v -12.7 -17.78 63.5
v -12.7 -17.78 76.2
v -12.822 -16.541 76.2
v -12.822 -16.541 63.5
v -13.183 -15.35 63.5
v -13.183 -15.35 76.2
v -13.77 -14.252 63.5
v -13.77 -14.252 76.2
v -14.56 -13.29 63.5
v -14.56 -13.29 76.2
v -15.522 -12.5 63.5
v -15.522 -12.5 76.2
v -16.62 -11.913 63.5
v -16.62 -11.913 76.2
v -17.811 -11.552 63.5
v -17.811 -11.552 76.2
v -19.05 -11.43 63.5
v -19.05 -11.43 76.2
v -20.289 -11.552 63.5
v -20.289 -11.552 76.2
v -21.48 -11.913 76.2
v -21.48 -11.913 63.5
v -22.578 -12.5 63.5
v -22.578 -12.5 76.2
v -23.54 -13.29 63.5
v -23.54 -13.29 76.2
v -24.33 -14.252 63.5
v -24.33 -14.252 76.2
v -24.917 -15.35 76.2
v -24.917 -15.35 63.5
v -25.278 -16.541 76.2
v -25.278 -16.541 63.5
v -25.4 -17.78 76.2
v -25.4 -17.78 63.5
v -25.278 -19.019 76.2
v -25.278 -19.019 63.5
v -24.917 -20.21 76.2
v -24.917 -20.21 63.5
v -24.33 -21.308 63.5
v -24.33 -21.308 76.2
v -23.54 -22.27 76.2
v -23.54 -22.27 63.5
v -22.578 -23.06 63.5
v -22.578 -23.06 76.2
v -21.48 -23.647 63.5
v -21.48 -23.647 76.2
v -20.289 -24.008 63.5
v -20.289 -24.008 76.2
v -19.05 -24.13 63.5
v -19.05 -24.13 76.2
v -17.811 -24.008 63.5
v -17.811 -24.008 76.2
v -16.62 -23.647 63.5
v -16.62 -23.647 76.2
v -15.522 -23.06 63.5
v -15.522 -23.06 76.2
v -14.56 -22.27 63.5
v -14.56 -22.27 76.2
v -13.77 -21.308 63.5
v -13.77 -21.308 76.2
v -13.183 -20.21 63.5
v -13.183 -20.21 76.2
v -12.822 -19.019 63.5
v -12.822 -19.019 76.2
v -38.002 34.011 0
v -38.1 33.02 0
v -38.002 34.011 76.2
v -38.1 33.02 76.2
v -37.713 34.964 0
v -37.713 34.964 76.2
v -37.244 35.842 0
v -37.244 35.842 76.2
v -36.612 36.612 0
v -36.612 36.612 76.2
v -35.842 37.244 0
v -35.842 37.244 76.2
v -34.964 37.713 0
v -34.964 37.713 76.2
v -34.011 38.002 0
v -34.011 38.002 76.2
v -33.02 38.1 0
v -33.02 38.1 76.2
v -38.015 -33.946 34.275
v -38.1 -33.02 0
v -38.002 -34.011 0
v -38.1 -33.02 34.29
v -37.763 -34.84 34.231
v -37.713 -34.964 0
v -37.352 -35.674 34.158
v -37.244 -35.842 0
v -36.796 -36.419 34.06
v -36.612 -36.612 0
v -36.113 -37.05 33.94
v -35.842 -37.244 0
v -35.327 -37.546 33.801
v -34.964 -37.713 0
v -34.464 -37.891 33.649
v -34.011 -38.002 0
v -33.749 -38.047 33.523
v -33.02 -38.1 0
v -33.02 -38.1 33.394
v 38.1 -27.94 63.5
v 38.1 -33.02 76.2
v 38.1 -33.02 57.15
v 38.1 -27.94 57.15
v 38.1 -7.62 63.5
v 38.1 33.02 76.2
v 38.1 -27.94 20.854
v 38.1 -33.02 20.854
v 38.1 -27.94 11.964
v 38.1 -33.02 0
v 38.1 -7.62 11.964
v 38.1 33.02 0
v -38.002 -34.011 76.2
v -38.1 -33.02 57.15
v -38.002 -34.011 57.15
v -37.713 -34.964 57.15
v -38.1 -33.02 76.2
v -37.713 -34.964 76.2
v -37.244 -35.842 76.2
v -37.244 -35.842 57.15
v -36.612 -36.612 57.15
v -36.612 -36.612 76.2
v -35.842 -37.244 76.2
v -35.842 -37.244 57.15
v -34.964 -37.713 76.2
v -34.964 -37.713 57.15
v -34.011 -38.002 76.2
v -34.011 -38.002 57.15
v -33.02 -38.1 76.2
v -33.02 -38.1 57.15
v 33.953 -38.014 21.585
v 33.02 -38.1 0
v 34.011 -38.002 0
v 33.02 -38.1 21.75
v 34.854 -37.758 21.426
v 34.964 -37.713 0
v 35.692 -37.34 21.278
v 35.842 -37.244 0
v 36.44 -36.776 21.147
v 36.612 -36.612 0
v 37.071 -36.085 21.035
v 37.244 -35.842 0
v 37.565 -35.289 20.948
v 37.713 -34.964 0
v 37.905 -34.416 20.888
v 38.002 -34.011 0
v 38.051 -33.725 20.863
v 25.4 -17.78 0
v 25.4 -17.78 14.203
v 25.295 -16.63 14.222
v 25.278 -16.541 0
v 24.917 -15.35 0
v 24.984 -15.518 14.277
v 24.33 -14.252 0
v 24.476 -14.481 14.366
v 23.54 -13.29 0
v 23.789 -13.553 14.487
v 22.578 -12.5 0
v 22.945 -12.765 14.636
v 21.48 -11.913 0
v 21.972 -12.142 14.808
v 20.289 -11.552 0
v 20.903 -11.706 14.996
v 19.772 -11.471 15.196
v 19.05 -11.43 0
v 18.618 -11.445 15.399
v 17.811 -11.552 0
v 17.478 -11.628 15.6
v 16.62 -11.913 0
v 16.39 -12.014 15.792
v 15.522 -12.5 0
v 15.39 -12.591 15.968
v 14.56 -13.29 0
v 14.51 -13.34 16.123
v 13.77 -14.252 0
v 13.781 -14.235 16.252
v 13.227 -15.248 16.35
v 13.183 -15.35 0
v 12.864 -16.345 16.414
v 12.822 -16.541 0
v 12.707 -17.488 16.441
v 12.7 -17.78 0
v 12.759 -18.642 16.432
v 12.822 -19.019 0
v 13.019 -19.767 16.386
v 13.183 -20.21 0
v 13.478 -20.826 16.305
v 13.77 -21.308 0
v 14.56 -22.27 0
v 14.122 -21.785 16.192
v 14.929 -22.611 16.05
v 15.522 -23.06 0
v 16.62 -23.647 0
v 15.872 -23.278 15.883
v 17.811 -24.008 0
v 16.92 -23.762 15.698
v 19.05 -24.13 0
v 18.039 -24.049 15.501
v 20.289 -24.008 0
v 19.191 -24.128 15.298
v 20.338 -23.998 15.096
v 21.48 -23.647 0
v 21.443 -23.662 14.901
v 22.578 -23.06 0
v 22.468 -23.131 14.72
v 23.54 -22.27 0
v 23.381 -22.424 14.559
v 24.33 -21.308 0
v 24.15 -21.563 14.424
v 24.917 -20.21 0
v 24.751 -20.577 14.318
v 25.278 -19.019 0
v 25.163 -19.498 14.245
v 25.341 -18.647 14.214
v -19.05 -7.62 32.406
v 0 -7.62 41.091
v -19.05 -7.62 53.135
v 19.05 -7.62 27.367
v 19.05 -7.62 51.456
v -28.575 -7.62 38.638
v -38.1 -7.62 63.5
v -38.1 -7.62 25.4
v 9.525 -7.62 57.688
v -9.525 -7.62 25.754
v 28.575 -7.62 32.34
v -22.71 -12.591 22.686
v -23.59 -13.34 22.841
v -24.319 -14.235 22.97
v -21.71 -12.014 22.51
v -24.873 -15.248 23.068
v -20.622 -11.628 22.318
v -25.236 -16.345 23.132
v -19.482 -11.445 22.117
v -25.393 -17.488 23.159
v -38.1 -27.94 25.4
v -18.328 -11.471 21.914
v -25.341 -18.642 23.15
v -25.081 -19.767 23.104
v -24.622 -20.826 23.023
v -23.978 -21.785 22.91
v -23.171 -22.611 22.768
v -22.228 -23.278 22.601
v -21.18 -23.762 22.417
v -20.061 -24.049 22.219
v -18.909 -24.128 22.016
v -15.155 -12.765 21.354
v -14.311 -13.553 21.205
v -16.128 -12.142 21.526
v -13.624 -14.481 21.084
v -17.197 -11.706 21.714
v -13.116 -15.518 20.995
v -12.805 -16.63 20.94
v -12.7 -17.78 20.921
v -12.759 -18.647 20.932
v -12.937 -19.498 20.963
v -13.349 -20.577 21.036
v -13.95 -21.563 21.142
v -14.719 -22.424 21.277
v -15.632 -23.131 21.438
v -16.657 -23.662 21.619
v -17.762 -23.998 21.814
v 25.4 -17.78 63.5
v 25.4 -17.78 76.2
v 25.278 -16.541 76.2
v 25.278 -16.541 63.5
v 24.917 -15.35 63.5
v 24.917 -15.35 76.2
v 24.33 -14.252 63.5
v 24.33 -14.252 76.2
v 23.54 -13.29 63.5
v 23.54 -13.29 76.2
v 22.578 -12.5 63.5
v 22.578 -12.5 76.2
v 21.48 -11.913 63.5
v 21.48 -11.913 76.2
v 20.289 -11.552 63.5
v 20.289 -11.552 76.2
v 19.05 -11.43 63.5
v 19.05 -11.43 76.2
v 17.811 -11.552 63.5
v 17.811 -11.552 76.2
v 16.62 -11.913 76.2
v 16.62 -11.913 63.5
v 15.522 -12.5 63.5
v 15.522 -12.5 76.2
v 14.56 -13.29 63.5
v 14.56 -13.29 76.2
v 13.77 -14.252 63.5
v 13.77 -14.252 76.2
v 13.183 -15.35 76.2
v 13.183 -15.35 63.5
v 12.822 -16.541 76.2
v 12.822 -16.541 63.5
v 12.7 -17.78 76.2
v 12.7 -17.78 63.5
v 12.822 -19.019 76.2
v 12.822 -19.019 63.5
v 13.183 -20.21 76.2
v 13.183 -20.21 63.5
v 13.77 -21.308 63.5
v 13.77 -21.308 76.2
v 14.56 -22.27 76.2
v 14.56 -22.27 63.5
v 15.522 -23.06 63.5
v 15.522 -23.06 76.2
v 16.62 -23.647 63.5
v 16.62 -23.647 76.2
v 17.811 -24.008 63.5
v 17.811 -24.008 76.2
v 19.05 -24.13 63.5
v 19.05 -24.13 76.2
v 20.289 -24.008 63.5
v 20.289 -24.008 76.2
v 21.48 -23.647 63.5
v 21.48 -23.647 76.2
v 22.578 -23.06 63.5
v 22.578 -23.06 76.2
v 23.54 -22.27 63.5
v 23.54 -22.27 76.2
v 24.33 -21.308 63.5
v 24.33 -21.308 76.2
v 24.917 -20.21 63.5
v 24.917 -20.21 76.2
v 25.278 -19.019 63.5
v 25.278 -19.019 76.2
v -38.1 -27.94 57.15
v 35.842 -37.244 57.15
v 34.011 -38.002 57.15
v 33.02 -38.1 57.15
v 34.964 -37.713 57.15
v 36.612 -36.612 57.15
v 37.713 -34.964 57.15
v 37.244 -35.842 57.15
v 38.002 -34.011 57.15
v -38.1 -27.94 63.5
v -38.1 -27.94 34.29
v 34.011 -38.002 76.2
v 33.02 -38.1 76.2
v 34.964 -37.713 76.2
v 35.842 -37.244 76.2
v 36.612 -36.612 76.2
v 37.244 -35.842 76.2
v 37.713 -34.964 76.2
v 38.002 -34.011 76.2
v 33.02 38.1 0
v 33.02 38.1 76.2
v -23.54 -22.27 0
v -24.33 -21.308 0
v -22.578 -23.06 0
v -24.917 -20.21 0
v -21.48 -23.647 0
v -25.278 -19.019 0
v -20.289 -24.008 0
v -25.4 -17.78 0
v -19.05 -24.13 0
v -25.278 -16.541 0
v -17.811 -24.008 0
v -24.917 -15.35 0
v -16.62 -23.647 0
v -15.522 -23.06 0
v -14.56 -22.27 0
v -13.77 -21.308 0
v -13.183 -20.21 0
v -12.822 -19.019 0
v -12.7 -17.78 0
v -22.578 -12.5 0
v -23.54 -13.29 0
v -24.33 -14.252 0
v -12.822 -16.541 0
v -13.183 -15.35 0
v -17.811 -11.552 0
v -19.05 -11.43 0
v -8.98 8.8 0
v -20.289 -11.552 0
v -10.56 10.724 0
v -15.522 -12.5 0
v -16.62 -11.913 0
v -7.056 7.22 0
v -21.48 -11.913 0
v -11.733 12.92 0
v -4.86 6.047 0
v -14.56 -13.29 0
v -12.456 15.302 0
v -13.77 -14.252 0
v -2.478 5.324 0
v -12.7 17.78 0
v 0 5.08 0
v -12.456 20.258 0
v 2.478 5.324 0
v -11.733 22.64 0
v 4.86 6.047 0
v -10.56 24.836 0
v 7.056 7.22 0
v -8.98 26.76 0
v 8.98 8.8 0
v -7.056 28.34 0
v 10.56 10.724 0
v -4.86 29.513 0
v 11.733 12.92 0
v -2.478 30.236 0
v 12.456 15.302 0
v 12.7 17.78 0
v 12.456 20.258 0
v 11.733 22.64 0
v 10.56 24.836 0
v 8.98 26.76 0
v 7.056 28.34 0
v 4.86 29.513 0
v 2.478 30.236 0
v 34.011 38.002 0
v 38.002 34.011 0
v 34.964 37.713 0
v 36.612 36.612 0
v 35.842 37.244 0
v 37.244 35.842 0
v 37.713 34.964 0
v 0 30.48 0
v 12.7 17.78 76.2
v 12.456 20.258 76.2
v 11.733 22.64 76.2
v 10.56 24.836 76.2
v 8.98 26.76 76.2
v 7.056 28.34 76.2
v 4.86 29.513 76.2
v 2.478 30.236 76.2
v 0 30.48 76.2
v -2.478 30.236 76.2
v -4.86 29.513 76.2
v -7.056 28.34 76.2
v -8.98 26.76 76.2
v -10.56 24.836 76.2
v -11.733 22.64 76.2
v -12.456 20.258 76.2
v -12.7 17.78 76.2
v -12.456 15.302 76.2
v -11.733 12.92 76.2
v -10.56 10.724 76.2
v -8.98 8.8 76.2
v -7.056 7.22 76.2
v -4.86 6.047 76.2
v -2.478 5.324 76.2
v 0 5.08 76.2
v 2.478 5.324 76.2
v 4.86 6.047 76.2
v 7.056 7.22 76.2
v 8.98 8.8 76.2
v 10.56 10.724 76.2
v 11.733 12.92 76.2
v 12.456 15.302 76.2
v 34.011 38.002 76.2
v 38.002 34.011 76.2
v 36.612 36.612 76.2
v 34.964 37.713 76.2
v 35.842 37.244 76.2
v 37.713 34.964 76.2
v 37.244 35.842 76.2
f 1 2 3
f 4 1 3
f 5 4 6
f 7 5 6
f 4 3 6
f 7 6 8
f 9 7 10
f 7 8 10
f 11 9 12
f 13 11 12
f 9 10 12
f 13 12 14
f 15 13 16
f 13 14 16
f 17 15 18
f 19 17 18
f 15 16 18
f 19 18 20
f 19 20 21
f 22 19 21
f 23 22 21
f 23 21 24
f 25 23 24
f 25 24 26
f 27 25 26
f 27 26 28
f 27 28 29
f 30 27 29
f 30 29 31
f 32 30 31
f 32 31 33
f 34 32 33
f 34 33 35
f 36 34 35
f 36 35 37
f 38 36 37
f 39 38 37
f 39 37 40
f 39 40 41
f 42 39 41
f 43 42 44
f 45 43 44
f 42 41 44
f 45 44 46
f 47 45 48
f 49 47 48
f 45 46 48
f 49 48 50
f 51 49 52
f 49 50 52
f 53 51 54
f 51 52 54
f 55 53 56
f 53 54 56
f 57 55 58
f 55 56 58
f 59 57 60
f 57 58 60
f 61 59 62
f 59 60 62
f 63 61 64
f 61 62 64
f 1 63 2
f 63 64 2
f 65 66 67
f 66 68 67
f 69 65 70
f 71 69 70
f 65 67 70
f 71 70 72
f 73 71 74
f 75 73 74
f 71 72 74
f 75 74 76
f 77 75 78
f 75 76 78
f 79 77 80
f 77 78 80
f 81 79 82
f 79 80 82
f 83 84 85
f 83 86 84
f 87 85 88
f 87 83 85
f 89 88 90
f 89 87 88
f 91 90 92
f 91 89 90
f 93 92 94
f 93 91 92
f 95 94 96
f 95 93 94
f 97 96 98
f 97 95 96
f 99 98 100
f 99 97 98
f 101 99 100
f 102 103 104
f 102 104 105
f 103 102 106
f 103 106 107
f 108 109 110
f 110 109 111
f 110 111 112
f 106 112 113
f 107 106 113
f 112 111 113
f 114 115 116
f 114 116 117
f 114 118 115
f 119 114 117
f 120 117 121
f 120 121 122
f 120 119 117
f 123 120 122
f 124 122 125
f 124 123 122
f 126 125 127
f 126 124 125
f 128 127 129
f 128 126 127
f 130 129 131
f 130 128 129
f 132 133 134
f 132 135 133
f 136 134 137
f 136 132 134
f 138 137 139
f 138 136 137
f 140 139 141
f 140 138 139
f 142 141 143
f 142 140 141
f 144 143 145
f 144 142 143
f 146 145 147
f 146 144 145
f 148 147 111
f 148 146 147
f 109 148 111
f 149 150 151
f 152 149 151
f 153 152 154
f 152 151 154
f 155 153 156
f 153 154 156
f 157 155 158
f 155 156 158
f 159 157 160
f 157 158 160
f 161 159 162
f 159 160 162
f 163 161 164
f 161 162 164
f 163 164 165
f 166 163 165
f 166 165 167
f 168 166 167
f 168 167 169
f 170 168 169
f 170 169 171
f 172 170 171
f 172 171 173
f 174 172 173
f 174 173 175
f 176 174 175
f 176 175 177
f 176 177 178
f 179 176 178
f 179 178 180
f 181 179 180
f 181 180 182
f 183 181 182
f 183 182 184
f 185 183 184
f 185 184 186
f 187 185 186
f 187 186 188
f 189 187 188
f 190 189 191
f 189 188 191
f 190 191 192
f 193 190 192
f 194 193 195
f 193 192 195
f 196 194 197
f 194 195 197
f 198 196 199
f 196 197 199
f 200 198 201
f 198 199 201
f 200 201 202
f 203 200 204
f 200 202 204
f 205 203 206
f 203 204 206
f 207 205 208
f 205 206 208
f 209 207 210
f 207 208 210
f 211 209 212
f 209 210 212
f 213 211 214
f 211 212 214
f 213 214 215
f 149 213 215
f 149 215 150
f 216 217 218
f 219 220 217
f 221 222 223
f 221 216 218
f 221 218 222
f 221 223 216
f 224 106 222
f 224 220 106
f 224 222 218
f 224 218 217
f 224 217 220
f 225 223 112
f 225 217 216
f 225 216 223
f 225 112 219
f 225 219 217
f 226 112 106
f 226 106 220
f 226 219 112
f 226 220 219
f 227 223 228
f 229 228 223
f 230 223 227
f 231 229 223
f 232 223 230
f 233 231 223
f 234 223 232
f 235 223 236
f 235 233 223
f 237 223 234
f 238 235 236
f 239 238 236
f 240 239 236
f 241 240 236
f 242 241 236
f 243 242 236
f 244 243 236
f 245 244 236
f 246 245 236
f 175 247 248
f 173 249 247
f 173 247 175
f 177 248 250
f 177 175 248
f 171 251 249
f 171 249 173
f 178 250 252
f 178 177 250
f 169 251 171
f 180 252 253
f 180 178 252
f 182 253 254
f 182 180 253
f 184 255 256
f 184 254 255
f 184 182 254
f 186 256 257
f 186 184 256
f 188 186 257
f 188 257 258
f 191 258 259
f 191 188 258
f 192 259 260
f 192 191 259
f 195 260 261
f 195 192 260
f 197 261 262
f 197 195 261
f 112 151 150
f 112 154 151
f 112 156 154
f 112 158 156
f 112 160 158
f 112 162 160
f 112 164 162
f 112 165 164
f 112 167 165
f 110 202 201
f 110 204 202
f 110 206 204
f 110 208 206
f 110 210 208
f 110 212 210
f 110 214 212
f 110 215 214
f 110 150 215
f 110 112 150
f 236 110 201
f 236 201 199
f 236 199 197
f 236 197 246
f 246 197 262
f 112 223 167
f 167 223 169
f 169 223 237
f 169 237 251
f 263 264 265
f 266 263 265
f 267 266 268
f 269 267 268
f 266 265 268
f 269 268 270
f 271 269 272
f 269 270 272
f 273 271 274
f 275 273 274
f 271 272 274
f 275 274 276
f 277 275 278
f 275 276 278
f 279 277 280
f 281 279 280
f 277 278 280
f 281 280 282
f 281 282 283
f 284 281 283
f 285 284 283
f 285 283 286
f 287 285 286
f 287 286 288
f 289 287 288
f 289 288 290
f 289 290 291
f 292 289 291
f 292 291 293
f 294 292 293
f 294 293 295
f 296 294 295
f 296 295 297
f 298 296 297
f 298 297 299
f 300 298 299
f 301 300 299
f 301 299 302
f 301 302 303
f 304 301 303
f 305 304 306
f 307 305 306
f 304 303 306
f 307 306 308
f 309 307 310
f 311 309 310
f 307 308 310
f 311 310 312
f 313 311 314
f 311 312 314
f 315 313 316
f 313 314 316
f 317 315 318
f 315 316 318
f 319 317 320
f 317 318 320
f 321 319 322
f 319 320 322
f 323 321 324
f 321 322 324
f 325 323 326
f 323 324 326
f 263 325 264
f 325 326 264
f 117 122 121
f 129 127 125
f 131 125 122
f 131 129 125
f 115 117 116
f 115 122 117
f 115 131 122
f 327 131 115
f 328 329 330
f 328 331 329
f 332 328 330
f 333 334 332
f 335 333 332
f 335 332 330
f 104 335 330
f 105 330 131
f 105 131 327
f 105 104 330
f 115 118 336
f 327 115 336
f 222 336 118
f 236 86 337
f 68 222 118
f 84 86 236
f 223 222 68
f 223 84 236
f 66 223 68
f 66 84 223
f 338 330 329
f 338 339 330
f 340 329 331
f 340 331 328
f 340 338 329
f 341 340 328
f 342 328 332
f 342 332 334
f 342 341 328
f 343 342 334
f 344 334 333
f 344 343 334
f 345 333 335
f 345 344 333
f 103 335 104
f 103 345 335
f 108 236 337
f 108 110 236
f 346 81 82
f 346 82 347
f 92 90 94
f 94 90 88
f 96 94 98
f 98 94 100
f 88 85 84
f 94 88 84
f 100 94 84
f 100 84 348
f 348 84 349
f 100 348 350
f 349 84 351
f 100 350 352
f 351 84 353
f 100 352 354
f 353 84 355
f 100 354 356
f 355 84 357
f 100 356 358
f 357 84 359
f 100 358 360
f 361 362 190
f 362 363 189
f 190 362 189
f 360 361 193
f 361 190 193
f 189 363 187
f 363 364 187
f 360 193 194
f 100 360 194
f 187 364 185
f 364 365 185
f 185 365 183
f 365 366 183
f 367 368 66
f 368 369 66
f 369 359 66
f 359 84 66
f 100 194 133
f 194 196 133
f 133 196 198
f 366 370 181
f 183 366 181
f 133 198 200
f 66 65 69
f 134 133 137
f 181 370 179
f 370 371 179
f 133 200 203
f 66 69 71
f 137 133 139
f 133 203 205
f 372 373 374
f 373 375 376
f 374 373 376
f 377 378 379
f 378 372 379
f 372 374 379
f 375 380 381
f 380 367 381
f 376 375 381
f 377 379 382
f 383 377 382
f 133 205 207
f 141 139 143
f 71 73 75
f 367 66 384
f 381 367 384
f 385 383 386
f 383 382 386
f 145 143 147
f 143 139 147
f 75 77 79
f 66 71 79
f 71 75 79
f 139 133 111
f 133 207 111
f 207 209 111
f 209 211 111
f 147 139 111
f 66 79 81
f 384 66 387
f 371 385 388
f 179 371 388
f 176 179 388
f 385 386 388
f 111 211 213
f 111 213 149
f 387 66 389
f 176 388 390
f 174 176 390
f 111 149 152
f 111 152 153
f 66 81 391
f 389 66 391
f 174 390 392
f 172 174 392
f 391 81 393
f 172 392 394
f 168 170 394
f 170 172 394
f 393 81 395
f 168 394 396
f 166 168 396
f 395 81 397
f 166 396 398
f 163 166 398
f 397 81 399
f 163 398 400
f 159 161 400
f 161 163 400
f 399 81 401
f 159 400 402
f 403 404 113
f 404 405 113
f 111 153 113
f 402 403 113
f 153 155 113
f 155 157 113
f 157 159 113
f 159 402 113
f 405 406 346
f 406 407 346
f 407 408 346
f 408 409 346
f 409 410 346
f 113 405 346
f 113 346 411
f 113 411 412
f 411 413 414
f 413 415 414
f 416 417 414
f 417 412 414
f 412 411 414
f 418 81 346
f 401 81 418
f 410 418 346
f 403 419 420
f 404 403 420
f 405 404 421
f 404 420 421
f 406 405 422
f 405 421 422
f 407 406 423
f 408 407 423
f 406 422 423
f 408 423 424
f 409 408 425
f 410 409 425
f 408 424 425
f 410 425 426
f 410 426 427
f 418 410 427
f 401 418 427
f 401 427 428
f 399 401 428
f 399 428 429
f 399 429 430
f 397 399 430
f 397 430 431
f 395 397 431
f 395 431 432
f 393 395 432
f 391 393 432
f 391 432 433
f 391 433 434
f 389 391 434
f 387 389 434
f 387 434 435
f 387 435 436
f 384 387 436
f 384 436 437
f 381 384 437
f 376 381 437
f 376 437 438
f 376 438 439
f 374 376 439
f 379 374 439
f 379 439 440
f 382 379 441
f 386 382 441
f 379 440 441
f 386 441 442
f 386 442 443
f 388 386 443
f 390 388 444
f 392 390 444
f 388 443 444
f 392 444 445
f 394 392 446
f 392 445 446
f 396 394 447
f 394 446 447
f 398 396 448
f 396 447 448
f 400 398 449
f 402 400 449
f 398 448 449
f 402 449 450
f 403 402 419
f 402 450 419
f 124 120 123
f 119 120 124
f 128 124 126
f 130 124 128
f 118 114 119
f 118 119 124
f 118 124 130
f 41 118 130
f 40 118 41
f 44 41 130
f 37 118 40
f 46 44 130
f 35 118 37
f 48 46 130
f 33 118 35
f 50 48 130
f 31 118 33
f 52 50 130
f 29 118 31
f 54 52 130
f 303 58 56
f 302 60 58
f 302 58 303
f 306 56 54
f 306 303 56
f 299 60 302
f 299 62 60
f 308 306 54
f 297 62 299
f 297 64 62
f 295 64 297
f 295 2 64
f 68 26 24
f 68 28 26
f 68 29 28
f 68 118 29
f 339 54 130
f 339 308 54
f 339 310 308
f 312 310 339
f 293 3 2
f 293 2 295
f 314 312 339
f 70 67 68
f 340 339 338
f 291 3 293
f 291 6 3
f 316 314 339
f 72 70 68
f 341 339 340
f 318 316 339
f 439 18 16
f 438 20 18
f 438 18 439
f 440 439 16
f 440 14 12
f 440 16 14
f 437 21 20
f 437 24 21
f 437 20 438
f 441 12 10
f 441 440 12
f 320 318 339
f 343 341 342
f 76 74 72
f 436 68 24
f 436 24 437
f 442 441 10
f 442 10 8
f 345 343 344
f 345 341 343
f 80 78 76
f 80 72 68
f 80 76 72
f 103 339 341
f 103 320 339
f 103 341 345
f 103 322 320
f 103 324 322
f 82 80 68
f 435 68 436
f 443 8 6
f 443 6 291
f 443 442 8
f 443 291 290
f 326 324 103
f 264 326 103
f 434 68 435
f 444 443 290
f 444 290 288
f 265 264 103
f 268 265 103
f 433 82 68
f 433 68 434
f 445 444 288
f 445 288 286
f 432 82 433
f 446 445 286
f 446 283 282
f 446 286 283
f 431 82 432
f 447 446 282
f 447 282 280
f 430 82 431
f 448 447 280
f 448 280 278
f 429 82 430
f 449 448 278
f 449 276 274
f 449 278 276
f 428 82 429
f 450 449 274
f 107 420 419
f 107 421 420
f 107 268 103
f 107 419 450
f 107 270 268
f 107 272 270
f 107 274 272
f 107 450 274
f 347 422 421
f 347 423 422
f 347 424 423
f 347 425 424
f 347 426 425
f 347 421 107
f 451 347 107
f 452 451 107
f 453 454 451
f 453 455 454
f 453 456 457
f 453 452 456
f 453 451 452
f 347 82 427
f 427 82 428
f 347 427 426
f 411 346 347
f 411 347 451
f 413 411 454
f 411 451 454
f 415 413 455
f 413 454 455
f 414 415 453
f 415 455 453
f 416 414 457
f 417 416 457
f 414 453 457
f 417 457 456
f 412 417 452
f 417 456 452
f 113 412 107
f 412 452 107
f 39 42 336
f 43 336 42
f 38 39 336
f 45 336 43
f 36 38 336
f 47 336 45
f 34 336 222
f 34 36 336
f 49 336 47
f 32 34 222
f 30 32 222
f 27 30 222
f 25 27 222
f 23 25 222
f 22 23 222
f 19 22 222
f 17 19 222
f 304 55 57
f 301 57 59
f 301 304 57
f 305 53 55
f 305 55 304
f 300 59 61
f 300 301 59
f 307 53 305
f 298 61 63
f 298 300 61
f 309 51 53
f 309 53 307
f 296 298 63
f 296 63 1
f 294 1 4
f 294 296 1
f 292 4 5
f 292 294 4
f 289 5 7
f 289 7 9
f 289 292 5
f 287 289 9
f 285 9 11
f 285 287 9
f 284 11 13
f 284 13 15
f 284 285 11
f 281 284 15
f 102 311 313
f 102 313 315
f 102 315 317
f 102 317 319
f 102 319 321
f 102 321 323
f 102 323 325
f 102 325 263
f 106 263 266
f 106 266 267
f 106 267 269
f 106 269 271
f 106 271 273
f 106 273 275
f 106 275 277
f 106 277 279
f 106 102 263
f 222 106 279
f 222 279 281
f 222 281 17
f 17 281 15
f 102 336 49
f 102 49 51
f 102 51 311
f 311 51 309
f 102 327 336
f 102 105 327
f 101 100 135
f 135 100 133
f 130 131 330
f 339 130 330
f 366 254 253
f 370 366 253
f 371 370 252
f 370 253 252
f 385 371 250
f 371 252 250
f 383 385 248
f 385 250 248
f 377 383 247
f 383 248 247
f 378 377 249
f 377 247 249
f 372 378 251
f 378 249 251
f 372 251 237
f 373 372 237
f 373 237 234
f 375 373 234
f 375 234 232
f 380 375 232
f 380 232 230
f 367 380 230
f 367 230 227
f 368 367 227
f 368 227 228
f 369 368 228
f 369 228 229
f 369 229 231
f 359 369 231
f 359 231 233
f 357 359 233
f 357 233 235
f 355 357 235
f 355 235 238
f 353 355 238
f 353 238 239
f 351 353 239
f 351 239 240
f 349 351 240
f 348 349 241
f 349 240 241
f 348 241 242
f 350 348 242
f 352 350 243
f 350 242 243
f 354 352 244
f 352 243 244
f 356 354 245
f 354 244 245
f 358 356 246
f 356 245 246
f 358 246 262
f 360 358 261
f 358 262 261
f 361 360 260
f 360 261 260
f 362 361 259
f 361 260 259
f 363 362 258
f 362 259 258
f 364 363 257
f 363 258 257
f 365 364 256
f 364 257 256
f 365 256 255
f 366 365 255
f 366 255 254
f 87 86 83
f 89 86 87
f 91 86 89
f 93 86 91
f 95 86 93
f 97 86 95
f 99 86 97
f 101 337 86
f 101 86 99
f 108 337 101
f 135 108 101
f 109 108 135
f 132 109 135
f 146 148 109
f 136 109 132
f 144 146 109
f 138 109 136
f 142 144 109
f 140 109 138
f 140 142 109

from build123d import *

# Parameters (mm, degrees)
F0_W     = 76.2
F0_H     = 76.2
F1_DEPTH = 76.2
F6_R     = 6.35
F6_R_2   = 12.7
F7_DEPTH = 76.2010001
F8_R     = 5.08


with BuildPart() as f1:
    # F0 (on Top) → F1 (new body)
    with BuildSketch(Plane.XY):
        Rectangle(F0_W, F0_H)
    extrude(amount=F1_DEPTH)

    # F2 (on face) → F5 section 0
    with BuildSketch(Plane(origin=(-38.1, 0, 0), x_dir=(0, -1, 0), z_dir=(-1, 0, 0))):
        Polygon((38.1, 34.29), (38.1, 57.15), (27.94, 57.15), (27.94, 63.5), (7.62, 63.5), (7.62, 25.4), (27.94, 25.4), (27.94, 34.29), align=None)
    # F4 (on face) → F5 section 1
    with BuildSketch(Plane.YZ.offset(38.1)):
        Polygon((-27.94, 57.15), (-38.1, 57.15), (-38.1, 20.85388407), (-27.94, 20.85388407), (-27.94, 11.96388407), (-7.62, 11.96388407), (-7.62, 63.5), (-27.94, 63.5), align=None)
    loft(mode=Mode.SUBTRACT)

    # F6 (on face) → F7 (cut, through all)
    with BuildSketch(Plane.XY.offset(76.2)):
        with Locations((-19.05, -17.78)):
            Circle(F6_R)
        with Locations((19.05, -17.78)):
            Circle(F6_R)
        with Locations((0, 17.78)):
            Circle(F6_R_2)
    extrude(amount=-F7_DEPTH, mode=Mode.SUBTRACT)

    # F8
    f8_edges = [f1.edges().sort_by_distance(p)[0] for p in [
        (38.1, 38.1, 38.1),
        (-38.1, 38.1, 38.1),
        (38.1, -38.1, 10.426942),
        (-38.1, -38.1, 17.145),
        (38.1, -38.1, 66.675),
        (-38.1, -38.1, 66.675),
    ]]
    fillet(f8_edges, radius=F8_R)


solid = f1.part
